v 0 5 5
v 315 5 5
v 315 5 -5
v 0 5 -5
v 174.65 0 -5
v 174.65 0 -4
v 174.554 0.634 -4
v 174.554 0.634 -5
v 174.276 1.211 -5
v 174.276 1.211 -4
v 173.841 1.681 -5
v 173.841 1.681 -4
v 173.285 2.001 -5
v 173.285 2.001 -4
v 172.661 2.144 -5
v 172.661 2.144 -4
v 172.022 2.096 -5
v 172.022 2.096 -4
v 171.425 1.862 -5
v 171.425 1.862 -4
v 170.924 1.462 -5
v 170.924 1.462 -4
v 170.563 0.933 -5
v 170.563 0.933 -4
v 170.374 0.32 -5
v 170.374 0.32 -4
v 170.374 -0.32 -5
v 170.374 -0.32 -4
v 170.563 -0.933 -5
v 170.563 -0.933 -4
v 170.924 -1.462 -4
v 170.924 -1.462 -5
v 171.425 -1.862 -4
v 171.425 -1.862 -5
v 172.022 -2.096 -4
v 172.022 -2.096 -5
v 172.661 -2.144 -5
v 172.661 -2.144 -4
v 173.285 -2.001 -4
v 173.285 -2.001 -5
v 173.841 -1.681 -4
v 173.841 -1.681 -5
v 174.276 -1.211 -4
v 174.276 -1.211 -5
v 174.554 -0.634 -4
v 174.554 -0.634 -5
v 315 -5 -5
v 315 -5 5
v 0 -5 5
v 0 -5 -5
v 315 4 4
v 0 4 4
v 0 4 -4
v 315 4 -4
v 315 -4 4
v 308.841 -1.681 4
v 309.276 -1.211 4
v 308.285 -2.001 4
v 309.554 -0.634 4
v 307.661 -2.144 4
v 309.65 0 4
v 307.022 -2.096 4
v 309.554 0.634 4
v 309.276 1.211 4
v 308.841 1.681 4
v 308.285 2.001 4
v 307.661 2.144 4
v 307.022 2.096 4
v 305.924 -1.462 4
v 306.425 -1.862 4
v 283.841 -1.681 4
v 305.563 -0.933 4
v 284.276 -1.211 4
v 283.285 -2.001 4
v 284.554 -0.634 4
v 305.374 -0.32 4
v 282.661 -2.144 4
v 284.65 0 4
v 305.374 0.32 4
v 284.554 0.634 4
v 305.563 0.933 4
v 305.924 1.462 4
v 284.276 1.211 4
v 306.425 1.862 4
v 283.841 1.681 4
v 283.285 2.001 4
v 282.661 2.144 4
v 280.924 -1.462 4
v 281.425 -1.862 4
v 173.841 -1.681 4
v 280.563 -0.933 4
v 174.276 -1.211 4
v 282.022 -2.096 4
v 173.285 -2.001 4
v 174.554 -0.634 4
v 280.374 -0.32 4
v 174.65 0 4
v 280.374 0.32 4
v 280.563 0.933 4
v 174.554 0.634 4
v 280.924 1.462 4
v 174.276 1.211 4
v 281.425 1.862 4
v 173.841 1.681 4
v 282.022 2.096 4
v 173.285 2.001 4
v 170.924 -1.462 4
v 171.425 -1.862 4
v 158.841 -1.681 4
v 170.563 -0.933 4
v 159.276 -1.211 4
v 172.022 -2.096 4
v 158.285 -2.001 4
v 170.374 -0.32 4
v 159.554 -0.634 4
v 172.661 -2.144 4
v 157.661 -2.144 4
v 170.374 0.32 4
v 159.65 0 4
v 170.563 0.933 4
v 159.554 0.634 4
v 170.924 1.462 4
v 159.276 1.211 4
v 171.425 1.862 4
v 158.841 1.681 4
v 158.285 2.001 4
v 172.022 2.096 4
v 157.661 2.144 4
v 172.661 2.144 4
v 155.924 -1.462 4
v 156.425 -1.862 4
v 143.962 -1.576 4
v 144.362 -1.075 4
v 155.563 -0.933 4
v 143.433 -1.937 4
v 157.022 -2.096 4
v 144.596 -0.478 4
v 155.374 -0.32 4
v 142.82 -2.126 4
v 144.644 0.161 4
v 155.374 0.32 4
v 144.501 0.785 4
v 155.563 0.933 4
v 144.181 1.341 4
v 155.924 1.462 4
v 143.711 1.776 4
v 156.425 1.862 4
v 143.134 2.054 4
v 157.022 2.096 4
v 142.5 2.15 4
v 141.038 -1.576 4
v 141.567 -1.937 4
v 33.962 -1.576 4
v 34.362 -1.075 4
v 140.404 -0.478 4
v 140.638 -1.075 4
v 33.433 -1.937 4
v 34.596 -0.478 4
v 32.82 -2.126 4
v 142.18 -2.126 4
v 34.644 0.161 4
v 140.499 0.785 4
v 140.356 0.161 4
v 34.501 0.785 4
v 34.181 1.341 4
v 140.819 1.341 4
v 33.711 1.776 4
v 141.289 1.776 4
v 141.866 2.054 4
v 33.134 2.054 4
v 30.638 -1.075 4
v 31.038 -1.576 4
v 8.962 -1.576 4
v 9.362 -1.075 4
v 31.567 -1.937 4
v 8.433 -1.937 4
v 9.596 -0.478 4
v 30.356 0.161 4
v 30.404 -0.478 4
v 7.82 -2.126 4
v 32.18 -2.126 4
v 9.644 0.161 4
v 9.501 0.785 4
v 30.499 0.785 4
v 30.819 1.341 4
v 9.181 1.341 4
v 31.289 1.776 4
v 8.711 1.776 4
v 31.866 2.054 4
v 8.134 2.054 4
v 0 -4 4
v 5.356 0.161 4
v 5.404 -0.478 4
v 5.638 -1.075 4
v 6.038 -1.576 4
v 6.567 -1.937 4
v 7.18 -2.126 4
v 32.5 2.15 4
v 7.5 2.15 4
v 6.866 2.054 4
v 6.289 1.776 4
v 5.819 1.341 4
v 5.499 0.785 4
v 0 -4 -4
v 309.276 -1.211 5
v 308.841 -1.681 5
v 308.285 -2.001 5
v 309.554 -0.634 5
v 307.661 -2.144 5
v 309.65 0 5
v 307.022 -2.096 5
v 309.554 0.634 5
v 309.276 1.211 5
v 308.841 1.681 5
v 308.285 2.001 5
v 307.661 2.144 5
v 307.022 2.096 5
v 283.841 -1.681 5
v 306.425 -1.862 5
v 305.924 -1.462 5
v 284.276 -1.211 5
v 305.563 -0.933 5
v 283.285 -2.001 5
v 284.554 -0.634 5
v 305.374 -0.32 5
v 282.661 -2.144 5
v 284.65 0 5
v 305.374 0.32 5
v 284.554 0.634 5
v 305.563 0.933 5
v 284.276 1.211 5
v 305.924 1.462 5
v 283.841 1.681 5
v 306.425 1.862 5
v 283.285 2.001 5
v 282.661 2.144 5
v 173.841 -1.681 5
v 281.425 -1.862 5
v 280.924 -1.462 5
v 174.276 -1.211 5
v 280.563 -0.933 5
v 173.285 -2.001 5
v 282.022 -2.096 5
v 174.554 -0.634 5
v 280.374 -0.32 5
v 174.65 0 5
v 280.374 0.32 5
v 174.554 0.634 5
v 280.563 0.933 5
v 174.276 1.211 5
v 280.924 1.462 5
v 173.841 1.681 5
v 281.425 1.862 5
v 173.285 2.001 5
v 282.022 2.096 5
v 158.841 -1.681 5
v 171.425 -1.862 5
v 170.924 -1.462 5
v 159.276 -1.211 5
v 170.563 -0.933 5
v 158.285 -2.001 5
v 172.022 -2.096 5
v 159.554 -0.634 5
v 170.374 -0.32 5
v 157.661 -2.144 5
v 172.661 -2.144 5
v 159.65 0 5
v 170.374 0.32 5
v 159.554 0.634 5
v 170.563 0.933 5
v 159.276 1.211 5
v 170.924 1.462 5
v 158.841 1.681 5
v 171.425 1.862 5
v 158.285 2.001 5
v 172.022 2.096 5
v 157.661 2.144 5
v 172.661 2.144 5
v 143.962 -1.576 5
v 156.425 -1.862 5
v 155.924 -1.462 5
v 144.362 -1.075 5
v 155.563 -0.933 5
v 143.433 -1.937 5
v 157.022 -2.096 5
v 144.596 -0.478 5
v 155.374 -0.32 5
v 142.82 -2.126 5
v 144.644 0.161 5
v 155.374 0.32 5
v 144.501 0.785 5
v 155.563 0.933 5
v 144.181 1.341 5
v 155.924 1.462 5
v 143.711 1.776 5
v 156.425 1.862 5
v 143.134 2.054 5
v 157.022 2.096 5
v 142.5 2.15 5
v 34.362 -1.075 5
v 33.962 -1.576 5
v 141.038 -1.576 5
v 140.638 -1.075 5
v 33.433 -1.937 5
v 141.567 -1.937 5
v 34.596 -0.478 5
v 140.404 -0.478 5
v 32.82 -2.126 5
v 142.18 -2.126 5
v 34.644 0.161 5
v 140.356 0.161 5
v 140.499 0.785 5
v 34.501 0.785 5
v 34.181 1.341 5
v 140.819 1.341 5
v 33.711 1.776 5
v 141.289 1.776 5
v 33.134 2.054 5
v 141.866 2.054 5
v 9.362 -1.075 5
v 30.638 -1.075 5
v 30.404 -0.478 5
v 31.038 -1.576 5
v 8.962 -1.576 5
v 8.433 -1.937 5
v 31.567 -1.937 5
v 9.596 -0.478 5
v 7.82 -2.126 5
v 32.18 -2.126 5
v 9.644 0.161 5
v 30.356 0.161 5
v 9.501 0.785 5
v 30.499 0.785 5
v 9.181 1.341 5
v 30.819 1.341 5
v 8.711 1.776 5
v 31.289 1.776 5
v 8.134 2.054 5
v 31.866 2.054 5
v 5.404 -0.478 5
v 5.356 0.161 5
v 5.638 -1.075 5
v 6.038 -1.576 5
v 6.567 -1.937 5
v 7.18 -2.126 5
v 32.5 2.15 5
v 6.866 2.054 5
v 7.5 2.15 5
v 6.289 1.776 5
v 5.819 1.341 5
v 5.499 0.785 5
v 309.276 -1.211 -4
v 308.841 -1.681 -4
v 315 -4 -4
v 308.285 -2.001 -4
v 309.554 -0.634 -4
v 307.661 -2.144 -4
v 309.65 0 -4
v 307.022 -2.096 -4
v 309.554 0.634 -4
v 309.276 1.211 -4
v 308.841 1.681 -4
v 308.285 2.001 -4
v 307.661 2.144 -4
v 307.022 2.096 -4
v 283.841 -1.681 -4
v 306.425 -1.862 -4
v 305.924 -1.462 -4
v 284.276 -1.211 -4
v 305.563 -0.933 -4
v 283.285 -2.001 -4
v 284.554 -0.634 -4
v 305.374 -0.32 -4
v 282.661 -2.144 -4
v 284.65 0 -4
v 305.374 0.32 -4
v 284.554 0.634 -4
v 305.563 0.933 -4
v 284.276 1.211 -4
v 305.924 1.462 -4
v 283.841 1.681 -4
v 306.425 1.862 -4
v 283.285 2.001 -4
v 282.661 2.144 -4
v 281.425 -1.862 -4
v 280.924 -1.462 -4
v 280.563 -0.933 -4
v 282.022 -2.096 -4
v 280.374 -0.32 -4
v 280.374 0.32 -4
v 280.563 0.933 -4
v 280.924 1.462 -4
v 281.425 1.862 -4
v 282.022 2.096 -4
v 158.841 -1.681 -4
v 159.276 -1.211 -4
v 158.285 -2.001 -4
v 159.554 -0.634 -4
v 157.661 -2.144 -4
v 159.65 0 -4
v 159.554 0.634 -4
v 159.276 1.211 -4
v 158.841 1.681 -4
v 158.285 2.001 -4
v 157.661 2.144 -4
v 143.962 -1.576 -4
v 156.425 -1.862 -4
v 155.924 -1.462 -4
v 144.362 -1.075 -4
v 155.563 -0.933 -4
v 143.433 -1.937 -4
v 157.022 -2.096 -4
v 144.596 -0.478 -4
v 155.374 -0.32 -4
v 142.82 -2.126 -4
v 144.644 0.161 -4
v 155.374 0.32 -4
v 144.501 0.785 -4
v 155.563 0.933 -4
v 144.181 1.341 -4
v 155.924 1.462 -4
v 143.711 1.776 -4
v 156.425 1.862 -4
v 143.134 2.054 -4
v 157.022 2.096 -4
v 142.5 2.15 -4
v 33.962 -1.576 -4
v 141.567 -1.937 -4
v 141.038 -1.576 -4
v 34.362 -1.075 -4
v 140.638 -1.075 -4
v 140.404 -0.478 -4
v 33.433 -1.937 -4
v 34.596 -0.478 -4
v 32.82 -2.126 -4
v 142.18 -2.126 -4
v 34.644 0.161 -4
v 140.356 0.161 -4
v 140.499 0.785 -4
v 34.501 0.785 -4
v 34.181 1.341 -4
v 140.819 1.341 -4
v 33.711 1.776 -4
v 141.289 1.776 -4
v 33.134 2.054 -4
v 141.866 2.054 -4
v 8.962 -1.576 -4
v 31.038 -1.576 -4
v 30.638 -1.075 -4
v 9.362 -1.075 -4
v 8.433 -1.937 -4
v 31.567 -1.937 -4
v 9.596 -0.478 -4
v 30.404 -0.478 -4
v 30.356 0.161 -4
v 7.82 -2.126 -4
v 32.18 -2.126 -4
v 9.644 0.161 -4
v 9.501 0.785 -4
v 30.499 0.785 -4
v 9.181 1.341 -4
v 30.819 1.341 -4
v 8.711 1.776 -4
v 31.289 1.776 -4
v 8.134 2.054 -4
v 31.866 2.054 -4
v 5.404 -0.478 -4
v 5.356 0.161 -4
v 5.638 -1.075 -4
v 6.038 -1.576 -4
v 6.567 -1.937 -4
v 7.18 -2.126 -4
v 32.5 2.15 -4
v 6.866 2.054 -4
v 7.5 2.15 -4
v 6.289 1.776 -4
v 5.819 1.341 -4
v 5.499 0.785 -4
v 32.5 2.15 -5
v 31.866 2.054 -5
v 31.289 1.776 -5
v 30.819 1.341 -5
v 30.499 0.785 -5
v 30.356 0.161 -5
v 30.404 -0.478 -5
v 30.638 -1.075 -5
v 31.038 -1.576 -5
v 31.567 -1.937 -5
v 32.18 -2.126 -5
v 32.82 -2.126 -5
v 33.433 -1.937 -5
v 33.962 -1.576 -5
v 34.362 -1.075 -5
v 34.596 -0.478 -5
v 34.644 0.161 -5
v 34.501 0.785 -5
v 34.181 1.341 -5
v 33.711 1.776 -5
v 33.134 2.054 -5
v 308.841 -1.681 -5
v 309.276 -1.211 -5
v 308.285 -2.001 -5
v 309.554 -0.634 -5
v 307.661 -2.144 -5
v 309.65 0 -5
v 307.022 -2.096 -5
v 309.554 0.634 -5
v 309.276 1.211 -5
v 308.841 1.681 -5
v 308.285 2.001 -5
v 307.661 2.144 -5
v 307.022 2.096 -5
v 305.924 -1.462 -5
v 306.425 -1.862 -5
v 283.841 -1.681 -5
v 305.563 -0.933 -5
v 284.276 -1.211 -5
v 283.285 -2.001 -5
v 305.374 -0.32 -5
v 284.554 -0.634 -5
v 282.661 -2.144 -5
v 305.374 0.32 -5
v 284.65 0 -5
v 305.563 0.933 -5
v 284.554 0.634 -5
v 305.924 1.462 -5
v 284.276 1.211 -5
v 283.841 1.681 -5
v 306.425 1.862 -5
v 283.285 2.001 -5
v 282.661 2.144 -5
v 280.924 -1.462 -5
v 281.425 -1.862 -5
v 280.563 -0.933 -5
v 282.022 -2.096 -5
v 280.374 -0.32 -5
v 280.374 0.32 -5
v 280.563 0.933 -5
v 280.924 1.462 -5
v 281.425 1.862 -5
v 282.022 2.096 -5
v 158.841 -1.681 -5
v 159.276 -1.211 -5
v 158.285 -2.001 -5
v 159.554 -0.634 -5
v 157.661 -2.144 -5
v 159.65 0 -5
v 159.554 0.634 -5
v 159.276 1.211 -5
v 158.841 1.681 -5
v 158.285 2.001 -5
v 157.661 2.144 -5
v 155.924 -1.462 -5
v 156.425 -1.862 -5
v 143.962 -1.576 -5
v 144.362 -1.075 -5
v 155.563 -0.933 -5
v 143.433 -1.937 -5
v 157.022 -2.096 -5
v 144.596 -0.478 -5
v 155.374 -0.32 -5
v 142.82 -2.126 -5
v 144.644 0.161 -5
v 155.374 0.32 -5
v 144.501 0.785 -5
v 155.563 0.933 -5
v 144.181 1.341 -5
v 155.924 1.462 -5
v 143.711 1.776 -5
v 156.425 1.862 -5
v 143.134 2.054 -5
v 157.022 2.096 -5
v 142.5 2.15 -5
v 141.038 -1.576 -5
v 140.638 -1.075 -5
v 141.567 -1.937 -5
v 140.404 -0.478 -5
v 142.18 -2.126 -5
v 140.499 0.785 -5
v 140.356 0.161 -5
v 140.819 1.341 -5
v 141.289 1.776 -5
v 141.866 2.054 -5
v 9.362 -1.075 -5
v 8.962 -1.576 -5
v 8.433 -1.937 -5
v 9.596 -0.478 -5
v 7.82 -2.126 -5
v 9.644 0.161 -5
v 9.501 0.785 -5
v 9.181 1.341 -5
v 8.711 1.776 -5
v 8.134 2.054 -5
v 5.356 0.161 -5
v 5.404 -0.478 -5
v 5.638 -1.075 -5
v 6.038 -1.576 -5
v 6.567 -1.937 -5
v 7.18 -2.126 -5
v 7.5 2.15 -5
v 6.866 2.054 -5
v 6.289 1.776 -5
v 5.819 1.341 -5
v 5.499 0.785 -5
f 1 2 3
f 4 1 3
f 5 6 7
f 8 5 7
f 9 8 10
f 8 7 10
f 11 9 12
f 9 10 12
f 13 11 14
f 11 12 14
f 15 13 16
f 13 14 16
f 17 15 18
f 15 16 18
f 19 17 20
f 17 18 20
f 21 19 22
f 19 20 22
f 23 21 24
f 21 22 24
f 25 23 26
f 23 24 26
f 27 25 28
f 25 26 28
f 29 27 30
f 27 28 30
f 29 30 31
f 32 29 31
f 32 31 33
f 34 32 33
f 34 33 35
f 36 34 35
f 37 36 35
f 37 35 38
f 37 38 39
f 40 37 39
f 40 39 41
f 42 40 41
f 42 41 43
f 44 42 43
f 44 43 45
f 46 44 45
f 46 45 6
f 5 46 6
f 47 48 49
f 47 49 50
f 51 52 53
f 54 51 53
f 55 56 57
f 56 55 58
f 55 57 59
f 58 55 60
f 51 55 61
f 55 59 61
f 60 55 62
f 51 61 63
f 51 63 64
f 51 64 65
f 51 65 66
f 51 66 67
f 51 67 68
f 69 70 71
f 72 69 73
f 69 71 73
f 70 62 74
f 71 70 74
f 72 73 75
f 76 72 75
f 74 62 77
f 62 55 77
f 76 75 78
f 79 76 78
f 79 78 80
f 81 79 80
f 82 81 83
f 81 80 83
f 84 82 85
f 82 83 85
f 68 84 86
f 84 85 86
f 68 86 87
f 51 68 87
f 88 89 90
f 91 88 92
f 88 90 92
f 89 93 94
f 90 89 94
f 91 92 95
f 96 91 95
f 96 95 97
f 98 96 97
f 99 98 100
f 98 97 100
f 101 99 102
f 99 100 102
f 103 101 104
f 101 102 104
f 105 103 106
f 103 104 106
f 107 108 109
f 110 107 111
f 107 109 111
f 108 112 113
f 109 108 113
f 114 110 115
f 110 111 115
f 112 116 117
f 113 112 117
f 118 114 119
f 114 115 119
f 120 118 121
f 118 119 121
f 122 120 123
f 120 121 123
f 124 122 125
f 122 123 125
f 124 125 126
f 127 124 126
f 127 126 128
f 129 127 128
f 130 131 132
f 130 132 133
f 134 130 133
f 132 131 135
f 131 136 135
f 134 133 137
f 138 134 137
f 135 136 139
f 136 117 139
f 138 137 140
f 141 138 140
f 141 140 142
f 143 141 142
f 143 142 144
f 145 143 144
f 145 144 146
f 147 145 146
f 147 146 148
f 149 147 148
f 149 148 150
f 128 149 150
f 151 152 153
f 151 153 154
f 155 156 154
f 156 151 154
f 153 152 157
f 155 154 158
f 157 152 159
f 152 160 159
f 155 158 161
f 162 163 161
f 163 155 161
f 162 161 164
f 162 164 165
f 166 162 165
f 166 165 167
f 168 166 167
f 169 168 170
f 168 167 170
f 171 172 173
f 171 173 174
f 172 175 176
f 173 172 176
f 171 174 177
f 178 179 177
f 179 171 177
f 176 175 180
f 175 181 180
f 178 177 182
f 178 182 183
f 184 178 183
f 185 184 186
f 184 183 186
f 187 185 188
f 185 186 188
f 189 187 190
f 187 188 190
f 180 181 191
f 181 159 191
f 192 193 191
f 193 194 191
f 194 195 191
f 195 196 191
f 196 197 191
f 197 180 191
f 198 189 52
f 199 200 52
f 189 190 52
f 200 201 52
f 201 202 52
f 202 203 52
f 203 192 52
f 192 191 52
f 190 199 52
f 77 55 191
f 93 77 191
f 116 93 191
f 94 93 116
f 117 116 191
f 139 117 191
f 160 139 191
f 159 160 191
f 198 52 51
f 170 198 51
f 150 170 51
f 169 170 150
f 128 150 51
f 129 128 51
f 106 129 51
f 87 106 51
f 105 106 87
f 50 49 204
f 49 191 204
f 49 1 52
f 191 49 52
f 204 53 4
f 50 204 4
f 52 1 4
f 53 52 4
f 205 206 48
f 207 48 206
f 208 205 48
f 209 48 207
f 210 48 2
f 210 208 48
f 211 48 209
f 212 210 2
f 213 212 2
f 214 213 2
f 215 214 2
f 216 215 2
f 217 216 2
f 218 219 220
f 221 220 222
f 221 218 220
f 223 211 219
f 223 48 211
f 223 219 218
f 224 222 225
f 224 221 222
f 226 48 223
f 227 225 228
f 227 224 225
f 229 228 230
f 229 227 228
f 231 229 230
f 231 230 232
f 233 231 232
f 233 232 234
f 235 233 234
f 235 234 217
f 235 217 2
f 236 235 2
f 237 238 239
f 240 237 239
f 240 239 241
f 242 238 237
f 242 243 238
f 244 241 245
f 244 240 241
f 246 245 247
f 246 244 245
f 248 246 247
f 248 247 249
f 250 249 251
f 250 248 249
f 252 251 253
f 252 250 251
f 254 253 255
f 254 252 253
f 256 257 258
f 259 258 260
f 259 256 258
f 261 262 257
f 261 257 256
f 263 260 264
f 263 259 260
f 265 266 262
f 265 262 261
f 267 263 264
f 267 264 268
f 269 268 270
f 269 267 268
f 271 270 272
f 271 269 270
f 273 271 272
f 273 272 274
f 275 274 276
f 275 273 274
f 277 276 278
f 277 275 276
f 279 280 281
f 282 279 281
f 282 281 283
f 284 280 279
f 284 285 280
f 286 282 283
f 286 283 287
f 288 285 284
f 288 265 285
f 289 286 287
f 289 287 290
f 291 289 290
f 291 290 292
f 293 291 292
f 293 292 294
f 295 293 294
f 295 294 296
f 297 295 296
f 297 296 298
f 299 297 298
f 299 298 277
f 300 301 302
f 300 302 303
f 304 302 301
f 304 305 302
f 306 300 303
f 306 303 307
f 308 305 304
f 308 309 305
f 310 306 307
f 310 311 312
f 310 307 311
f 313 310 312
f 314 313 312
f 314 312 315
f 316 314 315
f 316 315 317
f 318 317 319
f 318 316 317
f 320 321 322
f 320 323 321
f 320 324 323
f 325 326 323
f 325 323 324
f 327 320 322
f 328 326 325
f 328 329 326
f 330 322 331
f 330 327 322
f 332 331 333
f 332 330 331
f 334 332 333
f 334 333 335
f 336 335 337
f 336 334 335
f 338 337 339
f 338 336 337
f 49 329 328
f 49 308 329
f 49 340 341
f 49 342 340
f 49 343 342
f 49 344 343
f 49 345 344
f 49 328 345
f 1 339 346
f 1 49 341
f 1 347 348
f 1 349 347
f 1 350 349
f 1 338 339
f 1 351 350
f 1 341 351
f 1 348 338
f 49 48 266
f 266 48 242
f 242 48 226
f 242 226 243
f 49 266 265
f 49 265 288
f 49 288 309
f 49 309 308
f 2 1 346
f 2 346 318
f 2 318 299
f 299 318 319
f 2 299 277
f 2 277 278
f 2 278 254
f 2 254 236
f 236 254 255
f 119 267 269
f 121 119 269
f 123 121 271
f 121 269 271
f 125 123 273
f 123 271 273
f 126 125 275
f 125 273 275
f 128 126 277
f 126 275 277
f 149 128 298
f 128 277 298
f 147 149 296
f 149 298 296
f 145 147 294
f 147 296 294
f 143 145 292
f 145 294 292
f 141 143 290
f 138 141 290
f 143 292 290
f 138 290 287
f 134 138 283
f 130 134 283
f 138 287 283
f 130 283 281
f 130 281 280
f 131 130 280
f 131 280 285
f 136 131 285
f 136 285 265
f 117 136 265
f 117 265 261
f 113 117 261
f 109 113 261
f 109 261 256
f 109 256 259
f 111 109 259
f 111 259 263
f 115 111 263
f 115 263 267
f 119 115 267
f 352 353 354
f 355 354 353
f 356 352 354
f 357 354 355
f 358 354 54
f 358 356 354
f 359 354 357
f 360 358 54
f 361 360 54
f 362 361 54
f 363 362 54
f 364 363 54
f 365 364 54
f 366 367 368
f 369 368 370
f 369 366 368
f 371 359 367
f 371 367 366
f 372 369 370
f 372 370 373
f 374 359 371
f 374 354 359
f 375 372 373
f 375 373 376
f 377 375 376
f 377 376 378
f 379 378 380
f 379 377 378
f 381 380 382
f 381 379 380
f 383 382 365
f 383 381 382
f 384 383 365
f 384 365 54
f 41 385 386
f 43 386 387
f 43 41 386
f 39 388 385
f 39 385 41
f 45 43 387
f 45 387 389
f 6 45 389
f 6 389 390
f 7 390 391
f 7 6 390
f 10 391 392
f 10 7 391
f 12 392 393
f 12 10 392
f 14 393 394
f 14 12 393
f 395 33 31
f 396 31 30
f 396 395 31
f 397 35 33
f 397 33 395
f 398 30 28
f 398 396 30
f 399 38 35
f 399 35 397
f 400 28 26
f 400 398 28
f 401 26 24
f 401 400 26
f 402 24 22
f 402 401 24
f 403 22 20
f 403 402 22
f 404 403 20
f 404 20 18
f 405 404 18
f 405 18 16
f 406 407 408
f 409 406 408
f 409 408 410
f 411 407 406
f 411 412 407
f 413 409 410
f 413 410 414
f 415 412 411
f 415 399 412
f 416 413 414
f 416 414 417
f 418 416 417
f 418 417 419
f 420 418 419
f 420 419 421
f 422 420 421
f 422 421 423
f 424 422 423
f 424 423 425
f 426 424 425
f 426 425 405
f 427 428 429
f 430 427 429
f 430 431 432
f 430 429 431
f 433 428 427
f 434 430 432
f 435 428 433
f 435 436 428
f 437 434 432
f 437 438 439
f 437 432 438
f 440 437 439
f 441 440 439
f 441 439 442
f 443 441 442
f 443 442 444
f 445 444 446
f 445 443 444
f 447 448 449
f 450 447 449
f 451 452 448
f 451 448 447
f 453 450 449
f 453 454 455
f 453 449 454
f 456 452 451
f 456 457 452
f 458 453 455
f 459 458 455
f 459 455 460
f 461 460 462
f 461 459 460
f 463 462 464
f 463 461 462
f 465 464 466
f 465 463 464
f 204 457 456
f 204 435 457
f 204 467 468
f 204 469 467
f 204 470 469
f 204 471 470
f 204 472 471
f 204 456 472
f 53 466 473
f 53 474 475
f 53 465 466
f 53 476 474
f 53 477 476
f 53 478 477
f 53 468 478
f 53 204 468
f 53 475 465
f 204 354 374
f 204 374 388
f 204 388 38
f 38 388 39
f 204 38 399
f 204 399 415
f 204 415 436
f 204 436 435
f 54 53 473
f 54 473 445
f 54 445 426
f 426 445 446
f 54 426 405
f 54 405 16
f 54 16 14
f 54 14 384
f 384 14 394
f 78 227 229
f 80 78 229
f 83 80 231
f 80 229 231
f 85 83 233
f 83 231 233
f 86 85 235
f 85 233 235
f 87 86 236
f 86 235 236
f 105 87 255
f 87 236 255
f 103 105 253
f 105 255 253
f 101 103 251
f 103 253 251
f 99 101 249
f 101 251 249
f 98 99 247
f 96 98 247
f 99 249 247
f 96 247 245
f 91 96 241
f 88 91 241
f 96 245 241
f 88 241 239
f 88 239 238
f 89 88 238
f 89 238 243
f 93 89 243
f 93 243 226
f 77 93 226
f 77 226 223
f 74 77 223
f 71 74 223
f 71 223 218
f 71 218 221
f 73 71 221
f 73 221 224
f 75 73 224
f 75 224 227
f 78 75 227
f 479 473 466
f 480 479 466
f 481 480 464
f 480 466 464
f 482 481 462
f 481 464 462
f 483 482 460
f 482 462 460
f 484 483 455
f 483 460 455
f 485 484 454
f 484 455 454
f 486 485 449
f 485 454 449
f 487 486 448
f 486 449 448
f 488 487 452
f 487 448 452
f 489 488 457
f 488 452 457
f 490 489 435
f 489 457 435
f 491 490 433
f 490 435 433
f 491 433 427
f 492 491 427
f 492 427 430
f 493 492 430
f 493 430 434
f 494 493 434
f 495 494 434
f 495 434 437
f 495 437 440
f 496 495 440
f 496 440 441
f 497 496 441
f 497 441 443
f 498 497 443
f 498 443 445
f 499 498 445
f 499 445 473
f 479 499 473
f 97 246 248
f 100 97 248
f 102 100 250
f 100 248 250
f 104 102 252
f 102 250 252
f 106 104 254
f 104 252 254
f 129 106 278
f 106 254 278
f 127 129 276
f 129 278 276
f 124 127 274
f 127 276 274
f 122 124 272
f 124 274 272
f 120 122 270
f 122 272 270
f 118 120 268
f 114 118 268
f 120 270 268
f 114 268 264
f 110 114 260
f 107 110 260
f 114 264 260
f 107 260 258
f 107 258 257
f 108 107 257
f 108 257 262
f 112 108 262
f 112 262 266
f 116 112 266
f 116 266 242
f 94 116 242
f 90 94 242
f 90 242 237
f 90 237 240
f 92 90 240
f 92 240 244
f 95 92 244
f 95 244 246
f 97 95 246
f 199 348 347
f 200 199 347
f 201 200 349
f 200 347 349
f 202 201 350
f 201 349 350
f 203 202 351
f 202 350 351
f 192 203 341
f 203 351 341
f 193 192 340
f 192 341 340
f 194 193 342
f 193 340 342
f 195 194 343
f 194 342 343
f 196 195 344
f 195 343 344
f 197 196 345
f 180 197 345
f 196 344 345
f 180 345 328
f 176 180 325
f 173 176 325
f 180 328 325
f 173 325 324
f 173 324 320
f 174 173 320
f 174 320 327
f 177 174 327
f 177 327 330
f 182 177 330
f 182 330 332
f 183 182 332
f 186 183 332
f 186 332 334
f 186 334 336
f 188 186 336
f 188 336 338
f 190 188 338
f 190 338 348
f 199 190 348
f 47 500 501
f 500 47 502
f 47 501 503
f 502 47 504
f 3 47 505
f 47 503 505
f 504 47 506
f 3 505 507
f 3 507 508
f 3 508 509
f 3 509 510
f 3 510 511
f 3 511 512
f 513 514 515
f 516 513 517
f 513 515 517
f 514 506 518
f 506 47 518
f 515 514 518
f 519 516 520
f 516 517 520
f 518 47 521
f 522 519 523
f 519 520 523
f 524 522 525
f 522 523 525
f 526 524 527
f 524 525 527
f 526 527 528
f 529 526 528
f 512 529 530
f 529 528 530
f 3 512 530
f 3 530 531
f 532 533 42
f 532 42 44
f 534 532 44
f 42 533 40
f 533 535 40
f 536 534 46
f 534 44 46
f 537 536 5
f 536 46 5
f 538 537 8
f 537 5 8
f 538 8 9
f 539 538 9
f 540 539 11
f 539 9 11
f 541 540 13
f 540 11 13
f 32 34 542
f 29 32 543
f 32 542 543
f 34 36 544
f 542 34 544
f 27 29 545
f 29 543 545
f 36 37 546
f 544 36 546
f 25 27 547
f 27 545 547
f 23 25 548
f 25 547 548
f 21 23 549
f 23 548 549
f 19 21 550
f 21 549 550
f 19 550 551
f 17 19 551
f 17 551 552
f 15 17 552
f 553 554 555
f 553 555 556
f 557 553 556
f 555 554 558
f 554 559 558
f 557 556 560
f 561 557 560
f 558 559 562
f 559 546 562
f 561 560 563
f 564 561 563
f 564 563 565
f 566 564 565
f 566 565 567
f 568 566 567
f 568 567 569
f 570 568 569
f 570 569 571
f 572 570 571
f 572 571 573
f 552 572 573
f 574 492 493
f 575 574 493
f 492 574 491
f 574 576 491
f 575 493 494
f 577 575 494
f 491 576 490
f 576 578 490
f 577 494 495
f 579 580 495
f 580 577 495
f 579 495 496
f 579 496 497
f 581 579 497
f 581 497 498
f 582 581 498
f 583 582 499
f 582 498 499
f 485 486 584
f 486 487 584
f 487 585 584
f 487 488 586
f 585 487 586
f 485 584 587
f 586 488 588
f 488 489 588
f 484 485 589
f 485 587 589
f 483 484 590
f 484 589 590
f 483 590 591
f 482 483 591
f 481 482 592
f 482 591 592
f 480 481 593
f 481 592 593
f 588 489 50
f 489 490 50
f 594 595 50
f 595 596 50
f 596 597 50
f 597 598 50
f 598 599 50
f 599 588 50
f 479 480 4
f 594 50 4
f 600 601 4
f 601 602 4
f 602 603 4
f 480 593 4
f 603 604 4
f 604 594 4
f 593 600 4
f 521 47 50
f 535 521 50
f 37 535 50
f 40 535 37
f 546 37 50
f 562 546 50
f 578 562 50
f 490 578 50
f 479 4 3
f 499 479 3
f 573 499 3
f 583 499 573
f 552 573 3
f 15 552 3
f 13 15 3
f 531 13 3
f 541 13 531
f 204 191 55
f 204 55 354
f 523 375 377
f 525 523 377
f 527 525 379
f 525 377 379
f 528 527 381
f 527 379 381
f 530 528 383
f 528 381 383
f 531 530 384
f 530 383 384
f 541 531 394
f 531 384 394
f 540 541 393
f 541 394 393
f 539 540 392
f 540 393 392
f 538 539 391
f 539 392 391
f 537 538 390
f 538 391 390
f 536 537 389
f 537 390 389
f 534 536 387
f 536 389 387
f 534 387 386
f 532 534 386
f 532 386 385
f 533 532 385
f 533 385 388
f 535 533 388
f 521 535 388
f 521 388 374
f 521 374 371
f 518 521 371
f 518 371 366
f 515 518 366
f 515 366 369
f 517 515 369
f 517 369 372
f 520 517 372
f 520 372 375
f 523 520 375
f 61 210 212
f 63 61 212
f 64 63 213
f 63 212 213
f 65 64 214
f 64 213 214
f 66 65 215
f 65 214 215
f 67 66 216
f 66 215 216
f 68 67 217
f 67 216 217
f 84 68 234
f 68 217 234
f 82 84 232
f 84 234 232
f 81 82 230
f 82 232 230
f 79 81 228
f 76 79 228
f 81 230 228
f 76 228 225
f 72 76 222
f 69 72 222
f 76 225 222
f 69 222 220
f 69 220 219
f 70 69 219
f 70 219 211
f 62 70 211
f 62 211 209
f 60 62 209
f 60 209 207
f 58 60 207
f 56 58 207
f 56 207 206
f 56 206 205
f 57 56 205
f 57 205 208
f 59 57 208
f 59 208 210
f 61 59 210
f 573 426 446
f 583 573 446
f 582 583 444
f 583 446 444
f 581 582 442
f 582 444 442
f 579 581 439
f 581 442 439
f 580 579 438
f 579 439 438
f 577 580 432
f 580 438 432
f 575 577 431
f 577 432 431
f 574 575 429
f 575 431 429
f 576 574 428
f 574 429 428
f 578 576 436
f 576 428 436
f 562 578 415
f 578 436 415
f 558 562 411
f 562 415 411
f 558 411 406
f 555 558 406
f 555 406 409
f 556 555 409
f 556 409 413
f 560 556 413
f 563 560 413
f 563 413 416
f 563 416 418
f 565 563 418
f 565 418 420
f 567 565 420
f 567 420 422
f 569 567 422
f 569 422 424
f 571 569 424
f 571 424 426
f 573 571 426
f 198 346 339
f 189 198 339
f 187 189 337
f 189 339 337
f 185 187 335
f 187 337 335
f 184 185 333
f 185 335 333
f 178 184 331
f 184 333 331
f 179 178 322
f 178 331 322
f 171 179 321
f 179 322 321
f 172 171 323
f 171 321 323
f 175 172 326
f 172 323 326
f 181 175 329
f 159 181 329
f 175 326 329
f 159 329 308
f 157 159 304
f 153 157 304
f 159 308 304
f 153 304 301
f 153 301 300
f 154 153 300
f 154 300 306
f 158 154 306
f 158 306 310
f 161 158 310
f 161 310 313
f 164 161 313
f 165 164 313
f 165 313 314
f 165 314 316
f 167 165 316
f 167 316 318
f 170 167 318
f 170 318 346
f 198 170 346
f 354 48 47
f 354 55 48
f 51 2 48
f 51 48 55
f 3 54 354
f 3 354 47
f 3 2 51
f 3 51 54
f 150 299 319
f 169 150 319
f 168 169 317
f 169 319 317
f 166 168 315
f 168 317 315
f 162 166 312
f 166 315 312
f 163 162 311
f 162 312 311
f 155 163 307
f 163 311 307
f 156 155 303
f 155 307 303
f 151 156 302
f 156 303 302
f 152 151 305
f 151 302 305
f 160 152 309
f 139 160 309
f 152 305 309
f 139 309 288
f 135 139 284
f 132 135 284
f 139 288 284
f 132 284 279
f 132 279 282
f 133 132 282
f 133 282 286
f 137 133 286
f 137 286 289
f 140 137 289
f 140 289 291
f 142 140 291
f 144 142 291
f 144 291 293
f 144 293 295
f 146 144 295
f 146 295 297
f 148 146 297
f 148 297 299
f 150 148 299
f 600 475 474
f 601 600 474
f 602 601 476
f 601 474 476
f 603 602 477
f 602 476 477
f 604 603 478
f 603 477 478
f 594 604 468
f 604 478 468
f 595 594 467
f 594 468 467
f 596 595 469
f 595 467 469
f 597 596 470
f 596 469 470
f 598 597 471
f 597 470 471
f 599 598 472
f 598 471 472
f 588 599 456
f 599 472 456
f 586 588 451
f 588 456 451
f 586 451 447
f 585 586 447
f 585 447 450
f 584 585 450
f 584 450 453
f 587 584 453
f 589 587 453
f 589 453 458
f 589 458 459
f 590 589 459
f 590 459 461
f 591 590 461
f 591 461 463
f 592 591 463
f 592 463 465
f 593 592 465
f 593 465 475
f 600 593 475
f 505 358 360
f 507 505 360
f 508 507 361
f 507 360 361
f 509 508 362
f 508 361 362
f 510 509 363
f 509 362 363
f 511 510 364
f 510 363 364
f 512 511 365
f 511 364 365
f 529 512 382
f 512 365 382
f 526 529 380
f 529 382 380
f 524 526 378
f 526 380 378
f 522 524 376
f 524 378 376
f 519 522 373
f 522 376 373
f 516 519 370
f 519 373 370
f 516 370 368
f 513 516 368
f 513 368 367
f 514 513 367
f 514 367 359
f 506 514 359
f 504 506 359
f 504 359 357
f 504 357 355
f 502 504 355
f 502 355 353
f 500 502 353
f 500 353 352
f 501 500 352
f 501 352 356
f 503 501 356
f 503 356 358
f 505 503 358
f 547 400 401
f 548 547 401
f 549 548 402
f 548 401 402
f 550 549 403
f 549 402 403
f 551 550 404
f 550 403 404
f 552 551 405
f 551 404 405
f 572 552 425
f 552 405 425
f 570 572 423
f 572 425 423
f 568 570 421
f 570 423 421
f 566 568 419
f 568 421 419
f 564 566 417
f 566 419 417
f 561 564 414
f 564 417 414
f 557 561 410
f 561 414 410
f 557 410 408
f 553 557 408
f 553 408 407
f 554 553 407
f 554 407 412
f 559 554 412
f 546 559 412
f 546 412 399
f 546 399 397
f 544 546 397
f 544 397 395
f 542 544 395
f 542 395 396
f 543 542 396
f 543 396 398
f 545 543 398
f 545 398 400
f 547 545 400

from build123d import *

# Parameters (mm, degrees)
SKETCH_1_W          = 10
SKETCH_1_H          = 10
SKETCH_1_W_2        = 8
SKETCH_1_H_2        = 8
EXTRUDE_1_DEPTH     = 315
SKETCH_2_R          = 2.15
CUT_EXTRUDE_1_DEPTH = 316.198350249


with BuildPart() as part:
    # Sketch 1 → Extrude 1 (new body)
    with BuildSketch(Plane(origin=(0, 0, 0), x_dir=(0, 0, -1), z_dir=(1, 0, 0))):
        Rectangle(SKETCH_1_W, SKETCH_1_H)
        Rectangle(SKETCH_1_W_2, SKETCH_1_H_2, mode=Mode.SUBTRACT)
    extrude(amount=EXTRUDE_1_DEPTH)

    # Sketch 2 → Cut-Extrude 1 (cut, through all)
    with BuildSketch(Plane.XY.offset(5)):
        with Locations((307.5, 0)):
            Circle(SKETCH_2_R)
        with Locations((282.5, 0)):
            Circle(SKETCH_2_R)
        with Locations(Location((7.5, 0, 0), (0, 0, 90))):
            Circle(SKETCH_2_R)
        with Locations(Location((32.5, 0, 0), (0, 0, 90))):
            Circle(SKETCH_2_R)
        with Locations((172.5, 0)):
            Circle(SKETCH_2_R)
        with Locations((157.5, 0)):
            Circle(SKETCH_2_R)
        with Locations(Location((142.5, 0, 0), (0, 0, 90))):
            Circle(SKETCH_2_R)
    extrude(amount=-CUT_EXTRUDE_1_DEPTH, mode=Mode.SUBTRACT)


solid = part.part
